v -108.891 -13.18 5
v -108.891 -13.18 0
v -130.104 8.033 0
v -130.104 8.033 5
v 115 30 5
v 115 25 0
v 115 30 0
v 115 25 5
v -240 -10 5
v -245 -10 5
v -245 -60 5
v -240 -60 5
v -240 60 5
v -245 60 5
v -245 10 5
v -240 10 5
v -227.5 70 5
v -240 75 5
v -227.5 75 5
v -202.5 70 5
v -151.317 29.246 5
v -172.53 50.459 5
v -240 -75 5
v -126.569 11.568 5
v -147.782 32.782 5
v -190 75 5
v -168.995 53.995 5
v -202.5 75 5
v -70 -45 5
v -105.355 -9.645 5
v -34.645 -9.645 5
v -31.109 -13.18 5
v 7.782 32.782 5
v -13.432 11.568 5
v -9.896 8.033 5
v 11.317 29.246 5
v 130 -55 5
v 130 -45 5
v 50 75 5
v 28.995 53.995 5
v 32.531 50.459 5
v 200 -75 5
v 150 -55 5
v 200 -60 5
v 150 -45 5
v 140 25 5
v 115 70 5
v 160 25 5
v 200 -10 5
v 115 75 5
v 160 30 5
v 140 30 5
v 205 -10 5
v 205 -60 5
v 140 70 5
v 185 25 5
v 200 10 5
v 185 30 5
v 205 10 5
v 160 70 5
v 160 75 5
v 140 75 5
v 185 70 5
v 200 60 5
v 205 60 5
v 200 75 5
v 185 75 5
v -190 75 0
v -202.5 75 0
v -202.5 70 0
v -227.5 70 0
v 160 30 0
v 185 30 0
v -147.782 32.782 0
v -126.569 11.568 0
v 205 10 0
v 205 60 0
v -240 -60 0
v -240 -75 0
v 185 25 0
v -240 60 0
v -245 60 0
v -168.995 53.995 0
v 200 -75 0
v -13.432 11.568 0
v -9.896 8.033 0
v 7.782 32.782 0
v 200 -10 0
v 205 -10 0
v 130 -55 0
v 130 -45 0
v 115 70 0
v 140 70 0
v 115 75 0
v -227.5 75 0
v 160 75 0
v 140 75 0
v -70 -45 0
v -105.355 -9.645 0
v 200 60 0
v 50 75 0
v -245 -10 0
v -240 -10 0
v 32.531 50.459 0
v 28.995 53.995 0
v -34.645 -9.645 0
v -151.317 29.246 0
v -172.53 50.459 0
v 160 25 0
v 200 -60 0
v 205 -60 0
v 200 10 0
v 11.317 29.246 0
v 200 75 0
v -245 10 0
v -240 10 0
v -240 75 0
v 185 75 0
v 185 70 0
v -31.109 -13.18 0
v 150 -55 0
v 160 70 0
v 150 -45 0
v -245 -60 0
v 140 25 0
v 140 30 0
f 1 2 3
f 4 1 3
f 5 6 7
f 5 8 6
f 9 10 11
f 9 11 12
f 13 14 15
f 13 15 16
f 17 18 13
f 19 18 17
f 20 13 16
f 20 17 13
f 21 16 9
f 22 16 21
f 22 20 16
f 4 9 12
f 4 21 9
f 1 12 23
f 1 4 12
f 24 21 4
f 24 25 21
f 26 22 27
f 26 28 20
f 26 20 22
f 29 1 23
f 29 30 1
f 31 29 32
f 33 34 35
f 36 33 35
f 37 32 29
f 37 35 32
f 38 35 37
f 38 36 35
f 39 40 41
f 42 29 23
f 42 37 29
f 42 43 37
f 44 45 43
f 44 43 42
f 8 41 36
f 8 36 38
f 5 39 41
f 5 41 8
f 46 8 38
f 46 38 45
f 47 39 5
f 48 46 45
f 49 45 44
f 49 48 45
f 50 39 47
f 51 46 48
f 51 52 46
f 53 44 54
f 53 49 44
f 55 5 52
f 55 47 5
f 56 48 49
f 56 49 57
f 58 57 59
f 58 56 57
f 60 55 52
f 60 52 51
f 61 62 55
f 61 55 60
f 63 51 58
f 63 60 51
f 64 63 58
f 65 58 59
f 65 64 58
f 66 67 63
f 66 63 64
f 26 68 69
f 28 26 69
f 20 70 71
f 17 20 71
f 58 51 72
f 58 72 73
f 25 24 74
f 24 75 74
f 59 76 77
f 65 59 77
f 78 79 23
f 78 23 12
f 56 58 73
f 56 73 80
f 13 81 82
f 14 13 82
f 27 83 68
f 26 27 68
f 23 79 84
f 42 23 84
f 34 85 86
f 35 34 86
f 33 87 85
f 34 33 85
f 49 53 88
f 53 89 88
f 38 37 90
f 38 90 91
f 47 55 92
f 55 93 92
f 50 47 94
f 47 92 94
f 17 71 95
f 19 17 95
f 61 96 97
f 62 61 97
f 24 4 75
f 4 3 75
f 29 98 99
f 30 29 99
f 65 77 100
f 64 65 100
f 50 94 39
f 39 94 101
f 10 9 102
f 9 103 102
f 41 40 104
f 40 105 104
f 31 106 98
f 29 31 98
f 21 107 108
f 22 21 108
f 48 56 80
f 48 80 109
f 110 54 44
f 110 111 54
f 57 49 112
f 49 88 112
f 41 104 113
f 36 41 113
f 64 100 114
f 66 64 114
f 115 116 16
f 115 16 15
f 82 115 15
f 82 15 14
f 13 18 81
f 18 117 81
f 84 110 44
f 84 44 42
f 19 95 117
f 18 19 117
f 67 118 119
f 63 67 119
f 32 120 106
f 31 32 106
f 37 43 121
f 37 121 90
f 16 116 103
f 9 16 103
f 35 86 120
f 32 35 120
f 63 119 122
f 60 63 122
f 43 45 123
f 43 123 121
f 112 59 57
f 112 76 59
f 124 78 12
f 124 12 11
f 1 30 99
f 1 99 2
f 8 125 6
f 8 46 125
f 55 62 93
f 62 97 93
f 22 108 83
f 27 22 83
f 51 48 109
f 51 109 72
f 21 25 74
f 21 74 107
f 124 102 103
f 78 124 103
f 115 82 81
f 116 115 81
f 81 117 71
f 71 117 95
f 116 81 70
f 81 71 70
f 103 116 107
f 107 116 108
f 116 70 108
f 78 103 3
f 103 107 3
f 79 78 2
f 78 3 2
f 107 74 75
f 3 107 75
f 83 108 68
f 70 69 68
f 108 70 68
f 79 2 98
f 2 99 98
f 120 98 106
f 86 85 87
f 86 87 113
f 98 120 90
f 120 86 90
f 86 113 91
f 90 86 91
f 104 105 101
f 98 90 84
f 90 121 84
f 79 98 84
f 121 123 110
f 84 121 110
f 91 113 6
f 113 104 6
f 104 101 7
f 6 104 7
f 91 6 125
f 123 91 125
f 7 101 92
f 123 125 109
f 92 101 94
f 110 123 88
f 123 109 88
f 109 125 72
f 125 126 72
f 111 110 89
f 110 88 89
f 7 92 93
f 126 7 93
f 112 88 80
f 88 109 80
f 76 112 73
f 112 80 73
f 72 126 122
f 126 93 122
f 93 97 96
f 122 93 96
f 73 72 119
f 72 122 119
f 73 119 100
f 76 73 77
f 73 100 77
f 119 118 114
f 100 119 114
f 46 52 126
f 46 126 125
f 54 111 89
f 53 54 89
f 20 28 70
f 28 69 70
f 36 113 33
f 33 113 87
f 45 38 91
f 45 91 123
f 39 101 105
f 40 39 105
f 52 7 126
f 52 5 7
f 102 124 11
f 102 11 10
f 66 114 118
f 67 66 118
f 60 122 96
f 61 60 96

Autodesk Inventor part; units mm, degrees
ref_plane "YZ Plane" through (0, 0, 0) normal (1, 0, 0) x (0, 1, 0)
ref_plane "XZ Plane" through (0, 0, 0) normal (0, 1, 0) x (-1, 0, 0)
ref_plane "XY Plane" through (0, 0, 0) normal (0, 0, 1) x (1, 0, 0)
ref_plane "Work Plane1" through (-2209.9027, -145.7269, 0) normal (0, 0, 1) x (1, 0, 0)
sketch "Sketch1" plane through (-2209.9027, -145.7269, 0) normal (0, 0, 1) x (1, 0, 0)
  line L0 (1984.9027, 125.3224) -> (1984.9027, 70.7269) projected
  line L1 (1984.9027, 70.7269) -> (2394.9027, 70.7269) projected
  line L2 (2394.9027, 70.7269) -> (2394.9027, 125.3224) projected
  line L3 (2394.9027, 125.3224) -> (2409.9027, 125.3224) projected
  line L4 (2409.9027, 125.3224) -> (2409.9027, 220.7269) projected
  line L5 (2409.9027, 220.7269) -> (2394.9027, 220.7269) projected
  line L6 (1969.9027, 220.7269) -> (1969.9027, 125.3224) projected
  line L7 (1969.9027, 125.3224) -> (1984.9027, 125.3224) projected
  line L8 (1969.9027, 155.7269) -> (1969.9027, 205.7269) projected
  line L9 (1969.9027, 205.7269) -> (1964.9027, 205.7269) projected
  line L10 (1964.9027, 155.7269) -> (1964.9027, 205.7269) projected
  line L11 (1969.9027, 155.7269) -> (1964.9027, 155.7269) projected
  line L12 (1969.9027, 85.7269) -> (1969.9027, 135.7269) projected
  line L13 (1969.9027, 135.7269) -> (1964.9027, 135.7269) projected
  line L14 (1964.9027, 85.7269) -> (1964.9027, 135.7269) projected
  line L15 (1969.9027, 85.7269) -> (1964.9027, 85.7269) projected
  line L16 (1964.9027, 155.7269) -> (1969.9027, 155.7269)
  line L17 (1969.9027, 155.7269) -> (1969.9027, 135.7269)
  line L18 (1969.9027, 135.7269) -> (1964.9027, 135.7269)
  line L19 (1964.9027, 135.7269) -> (1964.9027, 155.7269)
  line L20 (1991.136, 206.6179) -> (1964.9027, 206.6179)
  line L21 (1964.9027, 206.6179) -> (1964.9027, 205.7269)
  line L22 (1964.9027, 205.7269) -> (1991.136, 205.7269)
  line L23 (1991.136, 205.7269) -> (1991.136, 206.6179)
  line L24 (1964.9027, 85.7269) -> (1991.136, 85.7269)
  line L25 (1991.136, 85.7269) -> (1991.136, 70.7269)
  line L26 (1991.136, 70.7269) -> (1964.9027, 70.7269)
  line L27 (1964.9027, 70.7269) -> (1964.9027, 85.7269)
  line L28 (1984.9027, 70.7269) -> (1969.9027, 70.7269)
  line L29 (1969.9027, 70.7269) -> (1969.9027, 125.3224)
  line L30 (1969.9027, 125.3224) -> (1984.9027, 125.3224)
  line L31 (1984.9027, 125.3224) -> (1984.9027, 70.7269)
  line L32 (2414.9027, 155.7269) -> (2414.9027, 205.7269) projected
  line L33 (2414.9027, 205.7269) -> (2409.9027, 205.7269) projected
  line L34 (2409.9027, 155.7269) -> (2409.9027, 205.7269) projected
  line L35 (2414.9027, 155.7269) -> (2409.9027, 155.7269) projected
  line L36 (2414.9027, 85.7269) -> (2414.9027, 135.7269) projected
  line L37 (2414.9027, 135.7269) -> (2409.9027, 135.7269) projected
  line L38 (2409.9027, 85.7269) -> (2409.9027, 135.7269) projected
  line L39 (2414.9027, 85.7269) -> (2409.9027, 85.7269) projected
  line L40 (2409.9027, 70.7269) -> (2394.9027, 70.7269)
  line L41 (2394.9027, 70.7269) -> (2394.9027, 125.3224)
  line L42 (2394.9027, 125.3224) -> (2409.9027, 125.3224)
  line L43 (2409.9027, 125.3224) -> (2409.9027, 70.7269)
  line L44 (2259.9027, 220.7269) -> (2238.8976, 199.7218) projected
  line L45 (2139.9027, 100.7269) -> (2104.5473, 136.0822) projected
  line L46 (2019.9027, 220.7269) -> (2007.4027, 220.7269) projected
  line L47 (2178.7935, 132.5467) -> (2175.258, 136.0822) projected
  line L48 (2104.5473, 136.0822) -> (2101.0118, 132.5467) projected
  line L49 (2101.0118, 132.5467) -> (2079.7986, 153.7599) projected
  line L50 (2079.7986, 153.7599) -> (2083.3341, 157.2954) projected
  line L51 (2083.3341, 157.2954) -> (2062.1209, 178.5086) projected
  line L52 (2062.1209, 178.5086) -> (2058.5854, 174.9731) projected
  line L53 (2058.5854, 174.9731) -> (2037.3722, 196.1863) projected
  line L54 (2037.3722, 196.1863) -> (2040.9077, 199.7218) projected
  line L55 (2238.8976, 199.7218) -> (2242.4332, 196.1863) projected
  line L56 (2242.4332, 196.1863) -> (2221.22, 174.9731) projected
  line L57 (2221.22, 174.9731) -> (2217.6844, 178.5086) projected
  line L58 (2217.6844, 178.5086) -> (2196.4712, 157.2954) projected
  line L59 (2196.4712, 157.2954) -> (2200.0068, 153.7599) projected
  line L60 (2200.0068, 153.7599) -> (2178.7935, 132.5467) projected
  line L61 (2369.9027, 215.7269) -> (2369.9027, 220.7269) projected
  line L62 (2369.9027, 220.7269) -> (2349.9027, 220.7269) projected
  line L63 (2349.9027, 220.7269) -> (2349.9027, 215.7269) projected
  line L64 (2349.9027, 215.7269) -> (2324.9027, 215.7269) projected
  line L65 (2324.9027, 215.7269) -> (2324.9027, 220.7269) projected
  line L66 (2007.4027, 220.7269) -> (2007.4027, 215.7269) projected
  line L67 (2007.4027, 215.7269) -> (1982.4027, 215.7269) projected
  line L68 (1982.4027, 215.7269) -> (1982.4027, 220.7269) projected
  line L69 (2394.9027, 220.7269) -> (2394.9027, 215.7269) projected
  line L70 (2394.9027, 215.7269) -> (2369.9027, 215.7269) projected
  line L71 (2324.9027, 220.7269) -> (2259.9027, 220.7269) projected
  line L72 (2175.258, 136.0822) -> (2139.9027, 100.7269) projected
  line L73 (2040.9077, 199.7218) -> (2019.9027, 220.7269) projected
  line L74 (1982.4027, 220.7269) -> (1969.9027, 220.7269) projected
  point P0 (2209.9027, 145.7269)
  point P1 (1991.136, 21.6179)
  point P2 (1991.136, 6.6179)
  point P3 (1969.9027, 85.7269)
  point P4 (820.3787, 21.6179)
  point P5 (1320.3787, 21.6179)
  point P6 (820.3787, 20.4045)
  point P7 (1984.9027, 70.7269)
  point P8 (1305.3787, -34.1911)
  point P9 (820.3787, 21.6179)
  point P10 (2409.9027, 125.3224)
  point P11 (2394.9027, 70.7269)
  point P12 (1969.9027, 206.6179)
extrude "Extrusion1" add sketch "Sketch1" along normal blind 5 contours L7 L6 L22 L23 L20 L74 L68 L67 L66 L46 L73 L54 L53 L52 L51 L50 L49 L48 L45 L72 L47 L60 L59 L58 L57 L56 L55 L44 L71 L65 L64 L63 L62 L61 L70 L69 L5 L4 L3 L2 L1 L25 L24 L0 | L0 L24 L12 L7 | L24 L25 L1 L0 | L0 L26 L29 L24 | L12 L15 L14 L13 L6 | L11 L10 L9 L6 | L2 L3 L38 L43 L40 | L6 L20 L23 L22 | L4 L37 L36 L39 L38 | L4 L33 L32 L35
sketch "Sketch3" plane through (-2209.9027, -145.7269, 5) normal (0, 0, 1) x (1, 0, 0)
  point P0 (2209.9027, 145.7269)
sketch "Sketch4" plane through (-2209.9027, -145.7269, 5) normal (0, 0, 1) x (1, 0, 0)
  line L0 (2324.9027, 175.7269) -> (2349.9027, 175.7269)
  line L1 (2349.9027, 175.7269) -> (2349.9027, 170.7269)
  line L2 (2349.9027, 170.7269) -> (2324.9027, 170.7269)
  line L3 (2324.9027, 170.7269) -> (2324.9027, 175.7269)
  line L4 (1969.9027, 220.7269) -> (1969.9027, 205.7269) projected
  line L5 (1969.9027, 155.7269) -> (1969.9027, 135.7269) projected
  line L6 (1969.9027, 135.7269) -> (1964.9027, 135.7269) projected
  line L7 (1964.9027, 135.7269) -> (1964.9027, 85.7269) projected
  line L8 (1969.9027, 70.7269) -> (2409.9027, 70.7269) projected
  line L9 (2409.9027, 85.7269) -> (2414.9027, 85.7269) projected
  line L10 (2414.9027, 85.7269) -> (2414.9027, 135.7269) projected
  line L11 (2414.9027, 135.7269) -> (2409.9027, 135.7269) projected
  line L12 (2409.9027, 135.7269) -> (2409.9027, 155.7269) projected
  line L13 (2409.9027, 155.7269) -> (2414.9027, 155.7269) projected
  line L14 (2414.9027, 155.7269) -> (2414.9027, 205.7269) projected
  line L15 (2414.9027, 205.7269) -> (2409.9027, 205.7269) projected
  line L16 (2409.9027, 205.7269) -> (2409.9027, 220.7269) projected
  line L17 (2409.9027, 220.7269) -> (2394.9027, 220.7269) projected
  line L18 (2369.9027, 175.7269) -> (2394.9027, 175.7269)
  line L19 (2394.9027, 175.7269) -> (2394.9027, 170.7269)
  line L20 (2394.9027, 170.7269) -> (2369.9027, 170.7269)
  line L21 (2369.9027, 170.7269) -> (2369.9027, 175.7269)
  line L22 (2259.9027, 220.7269) -> (2238.8976, 199.7218) projected
  line L23 (2139.9027, 100.7269) -> (2104.5473, 136.0822) projected
  line L24 (2019.9027, 220.7269) -> (2007.4027, 220.7269) projected
  line L25 (1964.9027, 85.7269) -> (1969.9027, 85.7269) projected
  line L26 (2409.9027, 70.7269) -> (2409.9027, 85.7269) projected
  line L27 (1969.9027, 85.7269) -> (1969.9027, 70.7269) projected
  line L28 (1964.9027, 205.7269) -> (1964.9027, 155.7269) projected
  line L29 (1964.9027, 155.7269) -> (1969.9027, 155.7269) projected
  line L30 (2238.8976, 199.7218) -> (2242.4332, 196.1863) projected
  line L31 (2242.4332, 196.1863) -> (2221.22, 174.9731) projected
  line L32 (2221.22, 174.9731) -> (2217.6844, 178.5086) projected
  line L33 (2217.6844, 178.5086) -> (2196.4712, 157.2954) projected
  line L34 (2196.4712, 157.2954) -> (2200.0068, 153.7599) projected
  line L35 (2200.0068, 153.7599) -> (2178.7935, 132.5467) projected
  line L36 (2178.7935, 132.5467) -> (2175.258, 136.0822) projected
  line L37 (2104.5473, 136.0822) -> (2101.0118, 132.5467) projected
  line L38 (2101.0118, 132.5467) -> (2079.7986, 153.7599) projected
  line L39 (2079.7986, 153.7599) -> (2083.3341, 157.2954) projected
  line L40 (2083.3341, 157.2954) -> (2062.1209, 178.5086) projected
  line L41 (2062.1209, 178.5086) -> (2058.5854, 174.9731) projected
  line L42 (2058.5854, 174.9731) -> (2037.3722, 196.1863) projected
  line L43 (2037.3722, 196.1863) -> (2040.9077, 199.7218) projected
  line L44 (2394.9027, 220.7269) -> (2394.9027, 215.7269) projected
  line L45 (2394.9027, 215.7269) -> (2369.9027, 215.7269) projected
  line L46 (2369.9027, 215.7269) -> (2369.9027, 220.7269) projected
  line L47 (2369.9027, 220.7269) -> (2349.9027, 220.7269) projected
  line L48 (2349.9027, 220.7269) -> (2349.9027, 215.7269) projected
  line L49 (2349.9027, 215.7269) -> (2324.9027, 215.7269) projected
  line L50 (2324.9027, 215.7269) -> (2324.9027, 220.7269) projected
  line L51 (2007.4027, 220.7269) -> (2007.4027, 215.7269) projected
  line L52 (2007.4027, 215.7269) -> (1982.4027, 215.7269) projected
  line L53 (1982.4027, 215.7269) -> (1982.4027, 220.7269) projected
  line L54 (2324.9027, 220.7269) -> (2259.9027, 220.7269) projected
  line L55 (2175.258, 136.0822) -> (2139.9027, 100.7269) projected
  line L56 (2040.9077, 199.7218) -> (2019.9027, 220.7269) projected
  line L57 (1982.4027, 220.7269) -> (1969.9027, 220.7269) projected
  line L58 (1969.9027, 205.7269) -> (1964.9027, 205.7269) projected
  point P0 (2209.9027, 145.7269)
  dimension "d16" = 25
  dimension "d17" = 5
  dimension "d18" = 100
  dimension "d19" = 25
  dimension "d20" = 5
  dimension "d22" = 15
  dimension "d25" = 20
extrude "Extrusion3" cut sketch "Sketch4" against normal blind 5 contours L0 L1 L2 L3 | L18 L19 L20 L21
sketch "Sketch5" plane through (-2209.9027, -145.7269, 5) normal (0, 0, 1) x (1, 0, 0)
  point P0 (2209.9027, 145.7269)
sketch "Sketch6" plane through (-2209.9027, -145.7269, 5) normal (0, 0, 1) x (1, 0, 0)
  line L0 (2394.9027, 175.7269) -> (2394.9027, 170.7269) projected
  line L1 (2394.9027, 170.7269) -> (2369.9027, 170.7269) projected
  line L2 (2369.9027, 170.7269) -> (2369.9027, 175.7269) projected
  line L3 (2369.9027, 175.7269) -> (2394.9027, 175.7269) projected
  line L4 (2349.9027, 175.7269) -> (2349.9027, 170.7269) projected
  line L5 (2349.9027, 170.7269) -> (2324.9027, 170.7269) projected
  line L6 (2324.9027, 170.7269) -> (2324.9027, 175.7269) projected
  line L7 (2324.9027, 175.7269) -> (2349.9027, 175.7269) projected
  line L8 (1964.9027, 85.7269) -> (1969.9027, 85.7269) projected
  line L9 (1969.9027, 85.7269) -> (1969.9027, 70.7269) projected
  line L10 (1969.9027, 70.7269) -> (2409.9027, 70.7269) projected
  line L11 (2409.9027, 70.7269) -> (2409.9027, 85.7269) projected
  line L12 (2409.9027, 85.7269) -> (2414.9027, 85.7269) projected
  line L13 (2414.9027, 85.7269) -> (2414.9027, 135.7269) projected
  line L14 (2414.9027, 135.7269) -> (2409.9027, 135.7269) projected
  line L15 (2409.9027, 135.7269) -> (2409.9027, 155.7269) projected
  line L16 (2409.9027, 155.7269) -> (2414.9027, 155.7269) projected
  line L17 (2414.9027, 155.7269) -> (2414.9027, 205.7269) projected
  line L18 (2414.9027, 205.7269) -> (2409.9027, 205.7269) projected
  line L19 (2409.9027, 205.7269) -> (2409.9027, 220.7269) projected
  line L20 (2409.9027, 220.7269) -> (2394.9027, 220.7269) projected
  line L21 (2394.9027, 220.7269) -> (2394.9027, 215.7269) projected
  line L22 (2394.9027, 215.7269) -> (2369.9027, 215.7269) projected
  line L23 (2369.9027, 215.7269) -> (2369.9027, 220.7269) projected
  line L24 (2369.9027, 220.7269) -> (2349.9027, 220.7269) projected
  line L25 (2349.9027, 220.7269) -> (2349.9027, 215.7269) projected
  line L26 (2349.9027, 215.7269) -> (2324.9027, 215.7269) projected
  line L27 (2324.9027, 215.7269) -> (2324.9027, 220.7269) projected
  line L28 (2259.9027, 220.7269) -> (2238.8976, 199.7218) projected
  line L29 (2238.8976, 199.7218) -> (2242.4332, 196.1863) projected
  line L30 (2242.4332, 196.1863) -> (2221.22, 174.9731) projected
  line L31 (2221.22, 174.9731) -> (2217.6844, 178.5086) projected
  line L32 (2217.6844, 178.5086) -> (2196.4712, 157.2954) projected
  line L33 (2196.4712, 157.2954) -> (2200.0068, 153.7599) projected
  line L34 (2200.0068, 153.7599) -> (2178.7935, 132.5467) projected
  line L35 (2178.7935, 132.5467) -> (2175.258, 136.0822) projected
  line L36 (2139.9027, 100.7269) -> (2104.5473, 136.0822) projected
  line L37 (2104.5473, 136.0822) -> (2101.0118, 132.5467) projected
  line L38 (2101.0118, 132.5467) -> (2079.7986, 153.7599) projected
  line L39 (2079.7986, 153.7599) -> (2083.3341, 157.2954) projected
  line L40 (2083.3341, 157.2954) -> (2062.1209, 178.5086) projected
  line L41 (2062.1209, 178.5086) -> (2058.5854, 174.9731) projected
  line L42 (2058.5854, 174.9731) -> (2037.3722, 196.1863) projected
  line L43 (2037.3722, 196.1863) -> (2040.9077, 199.7218) projected
  line L44 (2019.9027, 220.7269) -> (2007.4027, 220.7269) projected
  line L45 (2007.4027, 220.7269) -> (2007.4027, 215.7269) projected
  line L46 (2007.4027, 215.7269) -> (1982.4027, 215.7269) projected
  line L47 (1982.4027, 215.7269) -> (1982.4027, 220.7269) projected
  line L48 (1969.9027, 220.7269) -> (1969.9027, 205.7269) projected
  line L49 (1964.9027, 205.7269) -> (1964.9027, 155.7269) projected
  line L50 (1964.9027, 155.7269) -> (1969.9027, 155.7269) projected
  line L51 (1969.9027, 155.7269) -> (1969.9027, 135.7269) projected
  line L52 (1969.9027, 135.7269) -> (1964.9027, 135.7269) projected
  line L53 (1964.9027, 135.7269) -> (1964.9027, 85.7269) projected
  line L54 (2339.9027, 100.7269) -> (2359.9027, 100.7269)
  line L55 (2359.9027, 100.7269) -> (2359.9027, 90.7269)
  line L56 (2359.9027, 90.7269) -> (2339.9027, 90.7269)
  line L57 (2339.9027, 90.7269) -> (2339.9027, 100.7269)
  line L58 (2324.9027, 220.7269) -> (2259.9027, 220.7269) projected
  line L59 (2175.258, 136.0822) -> (2139.9027, 100.7269) projected
  line L60 (2040.9077, 199.7218) -> (2019.9027, 220.7269) projected
  line L61 (1982.4027, 220.7269) -> (1969.9027, 220.7269) projected
  line L62 (1969.9027, 205.7269) -> (1964.9027, 205.7269) projected
  point P0 (2209.9027, 145.7269)
  dimension "d26" = 20
  dimension "d27" = 10
  dimension "d28" = 20
  dimension "d29" = 50
extrude "Extrusion4" cut sketch "Sketch6" against normal blind 10 contours L54 L55 L56 L57
equation "\"d19\" = d16"
properties part number "Frontal"
